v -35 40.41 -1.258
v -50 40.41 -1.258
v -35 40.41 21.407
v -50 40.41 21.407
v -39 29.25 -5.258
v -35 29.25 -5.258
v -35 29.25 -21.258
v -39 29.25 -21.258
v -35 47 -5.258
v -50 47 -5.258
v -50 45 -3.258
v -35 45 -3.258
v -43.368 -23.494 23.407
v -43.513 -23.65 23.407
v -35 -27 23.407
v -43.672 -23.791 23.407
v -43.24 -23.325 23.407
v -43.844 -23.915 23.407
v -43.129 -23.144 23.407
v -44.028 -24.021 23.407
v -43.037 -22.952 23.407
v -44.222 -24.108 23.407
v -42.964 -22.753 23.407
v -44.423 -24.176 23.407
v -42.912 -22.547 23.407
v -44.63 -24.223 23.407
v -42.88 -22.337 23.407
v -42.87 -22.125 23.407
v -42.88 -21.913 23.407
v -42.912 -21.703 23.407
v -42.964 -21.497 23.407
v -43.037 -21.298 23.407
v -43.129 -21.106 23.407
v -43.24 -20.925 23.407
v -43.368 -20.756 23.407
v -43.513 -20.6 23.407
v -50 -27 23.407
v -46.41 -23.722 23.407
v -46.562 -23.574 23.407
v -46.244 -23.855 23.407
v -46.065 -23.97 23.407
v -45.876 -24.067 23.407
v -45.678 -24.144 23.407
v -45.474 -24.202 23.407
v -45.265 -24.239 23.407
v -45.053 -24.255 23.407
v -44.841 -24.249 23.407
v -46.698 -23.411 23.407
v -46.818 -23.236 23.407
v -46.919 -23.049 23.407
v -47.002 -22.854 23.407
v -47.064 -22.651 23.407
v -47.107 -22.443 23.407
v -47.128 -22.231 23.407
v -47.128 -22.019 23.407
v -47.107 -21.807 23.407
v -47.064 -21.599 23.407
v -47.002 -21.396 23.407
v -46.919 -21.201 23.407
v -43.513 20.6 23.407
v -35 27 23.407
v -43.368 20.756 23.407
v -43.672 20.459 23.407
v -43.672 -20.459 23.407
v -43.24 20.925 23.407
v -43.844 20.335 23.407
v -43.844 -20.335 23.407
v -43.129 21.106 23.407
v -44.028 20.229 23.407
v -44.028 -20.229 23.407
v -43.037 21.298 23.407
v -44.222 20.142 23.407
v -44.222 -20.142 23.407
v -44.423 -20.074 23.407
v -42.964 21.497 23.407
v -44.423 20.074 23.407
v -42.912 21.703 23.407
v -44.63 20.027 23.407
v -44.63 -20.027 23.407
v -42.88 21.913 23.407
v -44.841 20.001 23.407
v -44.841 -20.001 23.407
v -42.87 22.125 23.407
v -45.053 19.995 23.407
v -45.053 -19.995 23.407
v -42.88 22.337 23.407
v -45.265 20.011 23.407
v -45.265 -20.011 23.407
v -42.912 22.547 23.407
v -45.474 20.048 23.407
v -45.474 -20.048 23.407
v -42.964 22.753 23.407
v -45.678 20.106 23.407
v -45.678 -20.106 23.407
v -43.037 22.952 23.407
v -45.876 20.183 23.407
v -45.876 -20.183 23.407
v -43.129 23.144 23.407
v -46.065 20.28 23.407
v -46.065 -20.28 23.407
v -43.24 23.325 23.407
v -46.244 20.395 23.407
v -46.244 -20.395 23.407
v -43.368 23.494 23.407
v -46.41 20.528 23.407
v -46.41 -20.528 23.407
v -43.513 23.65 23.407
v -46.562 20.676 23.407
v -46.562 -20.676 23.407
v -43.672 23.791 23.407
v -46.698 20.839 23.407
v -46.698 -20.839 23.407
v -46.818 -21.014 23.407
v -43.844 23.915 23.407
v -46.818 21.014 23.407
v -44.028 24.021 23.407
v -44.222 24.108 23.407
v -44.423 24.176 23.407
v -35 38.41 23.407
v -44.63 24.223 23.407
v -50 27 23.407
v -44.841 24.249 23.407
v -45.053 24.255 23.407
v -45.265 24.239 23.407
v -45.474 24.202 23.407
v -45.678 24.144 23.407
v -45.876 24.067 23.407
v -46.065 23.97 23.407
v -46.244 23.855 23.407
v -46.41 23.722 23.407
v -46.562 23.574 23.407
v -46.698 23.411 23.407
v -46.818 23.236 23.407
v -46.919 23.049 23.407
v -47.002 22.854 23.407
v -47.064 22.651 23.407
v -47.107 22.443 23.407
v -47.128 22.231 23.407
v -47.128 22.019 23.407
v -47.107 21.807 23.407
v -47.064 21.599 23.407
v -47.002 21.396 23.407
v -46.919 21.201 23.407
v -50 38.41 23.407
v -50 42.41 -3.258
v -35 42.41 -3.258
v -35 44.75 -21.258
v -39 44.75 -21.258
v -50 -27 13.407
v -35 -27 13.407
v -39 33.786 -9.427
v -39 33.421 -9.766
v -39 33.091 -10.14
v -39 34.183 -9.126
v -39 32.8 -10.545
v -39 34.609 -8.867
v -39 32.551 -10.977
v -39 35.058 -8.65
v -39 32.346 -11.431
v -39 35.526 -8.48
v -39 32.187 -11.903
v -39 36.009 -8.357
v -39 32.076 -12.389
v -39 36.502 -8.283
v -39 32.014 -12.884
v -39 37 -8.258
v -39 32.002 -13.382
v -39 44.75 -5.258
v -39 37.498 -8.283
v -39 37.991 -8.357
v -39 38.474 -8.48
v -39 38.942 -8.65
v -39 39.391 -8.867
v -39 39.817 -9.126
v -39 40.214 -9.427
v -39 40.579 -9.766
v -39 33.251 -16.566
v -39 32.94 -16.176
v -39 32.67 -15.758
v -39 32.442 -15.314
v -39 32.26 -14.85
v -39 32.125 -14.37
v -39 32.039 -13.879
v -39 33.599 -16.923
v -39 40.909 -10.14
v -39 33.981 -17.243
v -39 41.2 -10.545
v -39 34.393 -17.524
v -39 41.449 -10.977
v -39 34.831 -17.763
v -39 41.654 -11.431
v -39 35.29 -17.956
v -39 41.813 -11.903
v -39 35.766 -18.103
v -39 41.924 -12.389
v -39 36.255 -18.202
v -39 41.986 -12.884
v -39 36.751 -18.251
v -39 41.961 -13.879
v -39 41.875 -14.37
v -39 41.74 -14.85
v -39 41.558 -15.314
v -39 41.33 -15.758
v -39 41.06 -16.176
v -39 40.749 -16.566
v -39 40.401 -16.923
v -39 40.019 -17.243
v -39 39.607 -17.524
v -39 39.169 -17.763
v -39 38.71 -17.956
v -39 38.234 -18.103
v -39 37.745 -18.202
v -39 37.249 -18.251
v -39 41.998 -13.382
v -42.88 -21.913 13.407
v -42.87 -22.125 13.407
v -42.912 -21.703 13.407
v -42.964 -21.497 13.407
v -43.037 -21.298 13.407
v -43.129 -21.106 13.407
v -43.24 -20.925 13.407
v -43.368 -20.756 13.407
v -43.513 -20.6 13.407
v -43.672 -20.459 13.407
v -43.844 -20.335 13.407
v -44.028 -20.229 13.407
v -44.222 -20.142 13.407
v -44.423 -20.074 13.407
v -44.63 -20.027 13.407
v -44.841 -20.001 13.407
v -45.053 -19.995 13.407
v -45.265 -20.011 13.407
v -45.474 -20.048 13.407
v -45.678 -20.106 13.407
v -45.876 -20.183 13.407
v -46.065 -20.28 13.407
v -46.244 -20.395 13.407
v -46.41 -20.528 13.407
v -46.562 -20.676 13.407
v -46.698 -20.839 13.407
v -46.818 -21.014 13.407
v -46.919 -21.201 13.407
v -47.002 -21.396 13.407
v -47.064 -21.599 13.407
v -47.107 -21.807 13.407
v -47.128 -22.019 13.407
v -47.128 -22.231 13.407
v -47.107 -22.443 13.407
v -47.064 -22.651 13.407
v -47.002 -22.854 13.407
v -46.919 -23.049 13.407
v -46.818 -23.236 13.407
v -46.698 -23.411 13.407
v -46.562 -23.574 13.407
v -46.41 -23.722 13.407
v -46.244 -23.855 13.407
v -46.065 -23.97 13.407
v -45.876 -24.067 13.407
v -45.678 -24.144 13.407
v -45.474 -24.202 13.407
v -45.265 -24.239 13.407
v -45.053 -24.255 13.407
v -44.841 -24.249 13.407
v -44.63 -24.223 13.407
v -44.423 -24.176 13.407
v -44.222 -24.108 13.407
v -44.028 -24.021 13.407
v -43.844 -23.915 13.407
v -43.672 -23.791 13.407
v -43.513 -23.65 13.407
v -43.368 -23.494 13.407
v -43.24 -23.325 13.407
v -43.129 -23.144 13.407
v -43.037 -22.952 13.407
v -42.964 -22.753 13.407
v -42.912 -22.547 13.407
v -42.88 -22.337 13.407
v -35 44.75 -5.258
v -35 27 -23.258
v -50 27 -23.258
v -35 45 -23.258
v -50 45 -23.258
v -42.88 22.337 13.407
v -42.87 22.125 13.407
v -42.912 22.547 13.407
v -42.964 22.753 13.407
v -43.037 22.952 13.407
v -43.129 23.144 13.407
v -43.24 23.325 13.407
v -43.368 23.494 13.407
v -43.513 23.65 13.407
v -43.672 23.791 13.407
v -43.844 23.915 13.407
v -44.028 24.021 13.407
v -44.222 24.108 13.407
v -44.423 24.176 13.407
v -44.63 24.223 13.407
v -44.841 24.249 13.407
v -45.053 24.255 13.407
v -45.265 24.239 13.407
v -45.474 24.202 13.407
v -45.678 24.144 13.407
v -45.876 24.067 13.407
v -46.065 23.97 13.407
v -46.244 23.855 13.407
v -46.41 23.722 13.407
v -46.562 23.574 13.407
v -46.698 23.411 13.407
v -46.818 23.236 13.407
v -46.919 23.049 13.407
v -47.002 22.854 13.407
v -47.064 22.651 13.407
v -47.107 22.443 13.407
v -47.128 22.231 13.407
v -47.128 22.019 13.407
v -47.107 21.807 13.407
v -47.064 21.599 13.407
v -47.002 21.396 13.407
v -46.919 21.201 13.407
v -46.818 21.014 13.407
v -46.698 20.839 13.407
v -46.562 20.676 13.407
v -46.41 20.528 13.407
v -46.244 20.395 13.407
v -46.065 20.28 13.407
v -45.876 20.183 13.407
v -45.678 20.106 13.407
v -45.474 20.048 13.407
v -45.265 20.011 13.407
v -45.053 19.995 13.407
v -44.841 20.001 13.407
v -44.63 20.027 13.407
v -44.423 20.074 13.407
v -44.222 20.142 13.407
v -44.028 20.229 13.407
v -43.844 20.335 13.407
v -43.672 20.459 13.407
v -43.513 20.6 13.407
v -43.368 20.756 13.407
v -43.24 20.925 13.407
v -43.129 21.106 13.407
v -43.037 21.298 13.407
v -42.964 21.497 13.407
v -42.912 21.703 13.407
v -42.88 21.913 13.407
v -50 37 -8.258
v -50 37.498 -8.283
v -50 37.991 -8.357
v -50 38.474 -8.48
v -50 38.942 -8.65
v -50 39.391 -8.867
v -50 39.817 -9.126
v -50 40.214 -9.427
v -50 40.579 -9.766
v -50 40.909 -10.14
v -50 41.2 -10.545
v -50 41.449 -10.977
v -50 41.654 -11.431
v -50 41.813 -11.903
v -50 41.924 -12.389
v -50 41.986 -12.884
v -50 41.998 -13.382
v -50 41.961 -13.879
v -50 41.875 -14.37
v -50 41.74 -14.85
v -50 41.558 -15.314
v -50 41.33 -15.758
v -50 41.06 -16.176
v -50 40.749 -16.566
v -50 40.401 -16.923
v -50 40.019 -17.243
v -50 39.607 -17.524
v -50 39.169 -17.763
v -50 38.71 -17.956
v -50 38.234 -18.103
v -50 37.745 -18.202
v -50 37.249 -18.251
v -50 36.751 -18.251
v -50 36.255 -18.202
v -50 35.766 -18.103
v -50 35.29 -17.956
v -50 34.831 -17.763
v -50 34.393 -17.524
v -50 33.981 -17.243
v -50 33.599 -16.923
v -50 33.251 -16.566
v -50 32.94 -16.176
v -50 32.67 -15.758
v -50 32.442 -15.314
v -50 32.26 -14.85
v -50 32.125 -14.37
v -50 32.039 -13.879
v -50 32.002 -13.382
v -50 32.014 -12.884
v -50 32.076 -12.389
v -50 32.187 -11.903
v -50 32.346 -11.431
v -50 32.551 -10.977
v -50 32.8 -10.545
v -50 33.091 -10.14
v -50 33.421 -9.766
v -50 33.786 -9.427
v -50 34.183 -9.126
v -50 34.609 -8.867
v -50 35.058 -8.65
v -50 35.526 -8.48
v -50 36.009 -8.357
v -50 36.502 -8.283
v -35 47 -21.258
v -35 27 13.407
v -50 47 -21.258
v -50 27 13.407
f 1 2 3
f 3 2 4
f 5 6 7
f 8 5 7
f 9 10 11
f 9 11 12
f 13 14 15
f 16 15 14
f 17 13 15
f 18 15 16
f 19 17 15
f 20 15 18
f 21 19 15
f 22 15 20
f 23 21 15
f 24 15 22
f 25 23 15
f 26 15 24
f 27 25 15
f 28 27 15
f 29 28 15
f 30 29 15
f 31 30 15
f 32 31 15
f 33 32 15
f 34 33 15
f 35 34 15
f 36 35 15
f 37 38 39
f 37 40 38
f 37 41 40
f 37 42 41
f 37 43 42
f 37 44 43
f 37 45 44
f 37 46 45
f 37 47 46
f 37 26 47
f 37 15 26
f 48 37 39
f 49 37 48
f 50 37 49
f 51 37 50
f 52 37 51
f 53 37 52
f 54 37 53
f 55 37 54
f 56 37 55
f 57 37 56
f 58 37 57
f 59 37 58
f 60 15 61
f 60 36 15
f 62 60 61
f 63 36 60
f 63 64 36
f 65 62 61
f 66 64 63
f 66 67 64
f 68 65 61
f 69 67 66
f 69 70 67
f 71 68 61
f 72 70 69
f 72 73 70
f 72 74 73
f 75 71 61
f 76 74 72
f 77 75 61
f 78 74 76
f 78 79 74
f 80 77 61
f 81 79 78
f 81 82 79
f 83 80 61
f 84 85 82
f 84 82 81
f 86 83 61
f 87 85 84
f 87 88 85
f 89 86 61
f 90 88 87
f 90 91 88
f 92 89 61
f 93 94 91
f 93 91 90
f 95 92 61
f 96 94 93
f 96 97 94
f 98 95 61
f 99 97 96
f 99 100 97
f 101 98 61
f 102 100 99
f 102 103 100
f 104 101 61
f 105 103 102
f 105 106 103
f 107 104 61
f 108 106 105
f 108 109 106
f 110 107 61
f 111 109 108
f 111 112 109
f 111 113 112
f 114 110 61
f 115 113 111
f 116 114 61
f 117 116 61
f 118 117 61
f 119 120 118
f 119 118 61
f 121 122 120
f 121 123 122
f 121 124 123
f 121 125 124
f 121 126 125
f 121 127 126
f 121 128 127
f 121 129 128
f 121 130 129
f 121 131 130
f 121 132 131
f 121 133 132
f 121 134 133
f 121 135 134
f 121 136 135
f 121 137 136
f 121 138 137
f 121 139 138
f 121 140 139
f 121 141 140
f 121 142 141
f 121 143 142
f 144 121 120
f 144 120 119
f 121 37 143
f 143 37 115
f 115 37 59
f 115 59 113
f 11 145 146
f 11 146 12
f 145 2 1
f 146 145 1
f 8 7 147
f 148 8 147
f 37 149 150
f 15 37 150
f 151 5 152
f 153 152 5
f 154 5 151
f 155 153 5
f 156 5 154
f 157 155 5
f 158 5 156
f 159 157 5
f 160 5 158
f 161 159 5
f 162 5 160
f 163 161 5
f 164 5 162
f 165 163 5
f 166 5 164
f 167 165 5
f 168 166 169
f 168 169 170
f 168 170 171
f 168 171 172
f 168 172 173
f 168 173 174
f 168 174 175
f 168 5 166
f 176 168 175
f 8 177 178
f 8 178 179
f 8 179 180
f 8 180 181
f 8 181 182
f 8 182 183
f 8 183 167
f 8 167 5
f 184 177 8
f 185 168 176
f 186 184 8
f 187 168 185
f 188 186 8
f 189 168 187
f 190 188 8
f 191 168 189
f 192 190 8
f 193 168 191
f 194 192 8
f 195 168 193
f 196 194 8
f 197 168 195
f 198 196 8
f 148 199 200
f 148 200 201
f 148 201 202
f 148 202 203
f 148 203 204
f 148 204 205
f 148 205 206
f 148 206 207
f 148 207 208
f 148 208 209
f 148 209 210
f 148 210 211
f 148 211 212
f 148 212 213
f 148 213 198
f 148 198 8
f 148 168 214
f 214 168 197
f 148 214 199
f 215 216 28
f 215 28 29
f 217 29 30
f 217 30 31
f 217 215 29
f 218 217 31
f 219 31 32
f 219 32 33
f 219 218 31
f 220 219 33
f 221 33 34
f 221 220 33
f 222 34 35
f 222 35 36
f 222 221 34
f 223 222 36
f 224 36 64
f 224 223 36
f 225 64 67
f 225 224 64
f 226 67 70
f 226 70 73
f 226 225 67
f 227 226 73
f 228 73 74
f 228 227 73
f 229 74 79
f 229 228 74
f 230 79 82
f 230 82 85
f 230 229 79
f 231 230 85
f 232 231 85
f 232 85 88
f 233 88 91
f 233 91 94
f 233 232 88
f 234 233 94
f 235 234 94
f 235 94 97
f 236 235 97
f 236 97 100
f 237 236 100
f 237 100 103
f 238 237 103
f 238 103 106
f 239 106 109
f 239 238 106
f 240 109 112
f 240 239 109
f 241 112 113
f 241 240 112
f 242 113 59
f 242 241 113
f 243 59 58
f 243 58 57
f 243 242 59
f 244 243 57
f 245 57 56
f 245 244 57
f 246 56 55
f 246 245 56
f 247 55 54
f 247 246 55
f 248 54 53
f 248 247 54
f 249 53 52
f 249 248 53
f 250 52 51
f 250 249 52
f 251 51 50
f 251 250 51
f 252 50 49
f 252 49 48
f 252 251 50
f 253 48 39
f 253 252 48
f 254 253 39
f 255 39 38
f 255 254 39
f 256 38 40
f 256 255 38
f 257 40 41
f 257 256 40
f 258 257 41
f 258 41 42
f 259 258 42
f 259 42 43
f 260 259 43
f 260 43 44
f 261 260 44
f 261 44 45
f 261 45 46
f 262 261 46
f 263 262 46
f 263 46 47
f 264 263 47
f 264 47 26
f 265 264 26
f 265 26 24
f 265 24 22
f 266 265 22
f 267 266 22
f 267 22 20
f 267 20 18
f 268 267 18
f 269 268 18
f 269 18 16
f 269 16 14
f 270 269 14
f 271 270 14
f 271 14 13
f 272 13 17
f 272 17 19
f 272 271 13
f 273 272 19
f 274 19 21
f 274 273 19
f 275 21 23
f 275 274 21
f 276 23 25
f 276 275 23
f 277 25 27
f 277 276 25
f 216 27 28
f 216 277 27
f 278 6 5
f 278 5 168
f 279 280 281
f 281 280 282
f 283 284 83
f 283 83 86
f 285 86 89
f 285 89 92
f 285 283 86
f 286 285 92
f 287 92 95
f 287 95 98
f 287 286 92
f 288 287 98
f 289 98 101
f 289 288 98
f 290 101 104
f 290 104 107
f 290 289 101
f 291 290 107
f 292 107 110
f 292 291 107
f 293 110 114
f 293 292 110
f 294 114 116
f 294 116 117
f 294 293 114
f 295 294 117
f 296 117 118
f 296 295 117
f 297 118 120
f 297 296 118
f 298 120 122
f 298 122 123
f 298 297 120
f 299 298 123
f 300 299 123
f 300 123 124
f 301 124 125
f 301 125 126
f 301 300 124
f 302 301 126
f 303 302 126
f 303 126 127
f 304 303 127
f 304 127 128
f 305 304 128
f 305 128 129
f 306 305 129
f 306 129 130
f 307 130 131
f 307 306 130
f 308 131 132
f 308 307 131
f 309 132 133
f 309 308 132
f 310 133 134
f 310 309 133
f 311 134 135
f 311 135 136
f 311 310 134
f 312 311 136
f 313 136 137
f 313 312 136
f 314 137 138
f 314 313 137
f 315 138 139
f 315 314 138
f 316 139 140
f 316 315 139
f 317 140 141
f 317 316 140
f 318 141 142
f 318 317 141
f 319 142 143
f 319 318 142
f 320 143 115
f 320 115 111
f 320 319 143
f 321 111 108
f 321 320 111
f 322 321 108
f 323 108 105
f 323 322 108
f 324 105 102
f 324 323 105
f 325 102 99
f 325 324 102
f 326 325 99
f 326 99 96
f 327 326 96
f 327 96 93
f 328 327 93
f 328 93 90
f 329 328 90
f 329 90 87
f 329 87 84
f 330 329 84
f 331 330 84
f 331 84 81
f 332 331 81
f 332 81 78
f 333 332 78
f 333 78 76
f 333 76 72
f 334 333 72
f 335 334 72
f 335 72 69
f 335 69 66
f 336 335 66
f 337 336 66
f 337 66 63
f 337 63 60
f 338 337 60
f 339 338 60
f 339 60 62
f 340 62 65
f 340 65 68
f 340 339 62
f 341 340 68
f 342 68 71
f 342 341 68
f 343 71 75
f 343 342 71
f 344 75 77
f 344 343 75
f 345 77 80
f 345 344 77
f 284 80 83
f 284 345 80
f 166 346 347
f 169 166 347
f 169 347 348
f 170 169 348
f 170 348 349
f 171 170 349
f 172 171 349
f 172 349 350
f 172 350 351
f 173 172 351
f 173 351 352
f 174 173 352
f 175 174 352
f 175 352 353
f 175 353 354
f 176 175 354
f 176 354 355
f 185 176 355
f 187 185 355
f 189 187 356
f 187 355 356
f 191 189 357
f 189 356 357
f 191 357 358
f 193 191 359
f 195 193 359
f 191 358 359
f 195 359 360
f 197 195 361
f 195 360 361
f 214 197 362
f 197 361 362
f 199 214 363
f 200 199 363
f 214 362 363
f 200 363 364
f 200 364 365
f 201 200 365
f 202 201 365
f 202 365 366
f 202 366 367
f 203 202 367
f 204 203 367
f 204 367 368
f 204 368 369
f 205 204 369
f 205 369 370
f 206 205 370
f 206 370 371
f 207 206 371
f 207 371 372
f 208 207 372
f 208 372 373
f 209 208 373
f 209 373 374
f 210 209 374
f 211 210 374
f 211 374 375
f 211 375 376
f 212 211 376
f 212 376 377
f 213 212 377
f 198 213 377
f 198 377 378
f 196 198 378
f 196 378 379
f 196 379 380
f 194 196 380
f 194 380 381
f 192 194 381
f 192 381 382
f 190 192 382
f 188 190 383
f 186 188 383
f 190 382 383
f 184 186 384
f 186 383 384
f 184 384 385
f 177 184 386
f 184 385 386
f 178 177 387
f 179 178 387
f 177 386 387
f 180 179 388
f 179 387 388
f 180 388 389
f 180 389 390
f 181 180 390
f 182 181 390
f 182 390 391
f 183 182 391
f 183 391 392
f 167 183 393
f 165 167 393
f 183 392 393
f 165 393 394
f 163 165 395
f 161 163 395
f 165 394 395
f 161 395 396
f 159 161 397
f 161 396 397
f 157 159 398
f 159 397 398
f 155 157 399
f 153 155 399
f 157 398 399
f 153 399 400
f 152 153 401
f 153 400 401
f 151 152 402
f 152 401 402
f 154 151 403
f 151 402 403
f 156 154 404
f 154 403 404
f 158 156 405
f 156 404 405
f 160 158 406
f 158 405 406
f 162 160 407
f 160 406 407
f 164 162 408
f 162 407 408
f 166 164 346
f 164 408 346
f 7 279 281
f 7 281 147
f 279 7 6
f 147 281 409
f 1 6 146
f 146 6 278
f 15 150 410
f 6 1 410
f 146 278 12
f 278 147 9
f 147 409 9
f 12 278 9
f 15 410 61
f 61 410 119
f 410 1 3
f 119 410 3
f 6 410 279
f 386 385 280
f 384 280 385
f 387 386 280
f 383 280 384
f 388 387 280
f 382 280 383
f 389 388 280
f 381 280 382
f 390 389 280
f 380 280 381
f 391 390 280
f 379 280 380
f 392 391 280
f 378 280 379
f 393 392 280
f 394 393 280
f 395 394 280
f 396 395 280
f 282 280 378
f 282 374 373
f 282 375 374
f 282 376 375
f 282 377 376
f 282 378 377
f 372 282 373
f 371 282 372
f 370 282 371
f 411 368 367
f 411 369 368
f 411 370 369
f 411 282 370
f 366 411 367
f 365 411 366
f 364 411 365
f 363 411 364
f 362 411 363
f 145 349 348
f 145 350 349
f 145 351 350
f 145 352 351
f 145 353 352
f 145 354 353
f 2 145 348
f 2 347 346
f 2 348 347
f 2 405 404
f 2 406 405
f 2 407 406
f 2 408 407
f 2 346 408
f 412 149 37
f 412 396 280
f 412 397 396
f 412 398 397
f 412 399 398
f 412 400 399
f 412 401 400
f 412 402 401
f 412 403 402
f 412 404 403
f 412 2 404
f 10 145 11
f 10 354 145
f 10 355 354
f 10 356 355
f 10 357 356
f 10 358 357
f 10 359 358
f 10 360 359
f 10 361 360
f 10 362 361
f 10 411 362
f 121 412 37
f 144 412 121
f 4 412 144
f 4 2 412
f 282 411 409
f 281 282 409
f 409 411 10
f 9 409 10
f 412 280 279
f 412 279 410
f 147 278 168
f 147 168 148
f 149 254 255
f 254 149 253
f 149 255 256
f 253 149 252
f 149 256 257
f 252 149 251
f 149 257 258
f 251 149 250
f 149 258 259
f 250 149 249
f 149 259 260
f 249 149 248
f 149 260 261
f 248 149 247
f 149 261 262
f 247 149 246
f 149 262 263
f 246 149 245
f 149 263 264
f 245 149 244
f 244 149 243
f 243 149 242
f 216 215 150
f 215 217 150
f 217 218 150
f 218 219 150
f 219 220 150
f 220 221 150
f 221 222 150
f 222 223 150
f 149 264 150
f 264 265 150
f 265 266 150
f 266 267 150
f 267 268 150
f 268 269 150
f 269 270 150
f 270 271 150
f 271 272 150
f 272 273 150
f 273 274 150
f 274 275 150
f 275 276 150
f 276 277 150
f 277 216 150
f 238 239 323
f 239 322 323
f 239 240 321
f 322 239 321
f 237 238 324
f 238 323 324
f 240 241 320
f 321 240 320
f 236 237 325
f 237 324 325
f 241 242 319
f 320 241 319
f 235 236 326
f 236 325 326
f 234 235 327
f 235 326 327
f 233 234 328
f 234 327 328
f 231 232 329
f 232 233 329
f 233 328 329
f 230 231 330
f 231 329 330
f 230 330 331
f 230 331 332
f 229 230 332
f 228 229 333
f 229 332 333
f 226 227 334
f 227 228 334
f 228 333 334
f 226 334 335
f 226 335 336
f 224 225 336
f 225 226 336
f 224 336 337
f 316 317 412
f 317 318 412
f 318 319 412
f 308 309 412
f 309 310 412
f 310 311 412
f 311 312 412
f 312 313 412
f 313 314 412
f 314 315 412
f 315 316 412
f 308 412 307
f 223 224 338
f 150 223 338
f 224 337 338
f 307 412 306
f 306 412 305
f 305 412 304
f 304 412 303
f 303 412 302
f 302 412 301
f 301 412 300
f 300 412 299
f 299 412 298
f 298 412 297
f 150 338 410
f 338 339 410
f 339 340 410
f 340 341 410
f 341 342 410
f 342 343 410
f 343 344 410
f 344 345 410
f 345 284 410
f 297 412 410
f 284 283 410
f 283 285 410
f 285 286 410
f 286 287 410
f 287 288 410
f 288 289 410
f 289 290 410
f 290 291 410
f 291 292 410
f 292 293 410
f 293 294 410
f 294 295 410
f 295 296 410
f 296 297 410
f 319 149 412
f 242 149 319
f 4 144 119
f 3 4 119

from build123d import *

# Parameters (mm, degrees)
SKETCH1_W           = 15
SKETCH1_H           = 54
SKETCH1_R           = 2.1303
BOSS_EXTRUDE1_DEPTH = 10
SKETCH2_W           = 20
SKETCH2_H           = 20
SKETCH2_R           = 5
BOSS_EXTRUDE2_DEPTH = 15
SKETCH5_W           = 26.664475469
SKETCH5_H           = 13.40994033
BOSS_EXTRUDE3_DEPTH = 15
SKETCH3_W           = 16
SKETCH3_H           = 15.5
CUT_EXTRUDE2_DEPTH  = 4
CHAMFER1_SIZE       = 2
CHAMFER2_SIZE       = 2


with BuildPart() as part:
    # Sketch1 → Boss-Extrude1 (new body)
    with BuildSketch(Plane.XY.offset(13.406799166)):
        with Locations((-42.5, 0)):
            Rectangle(SKETCH1_W, SKETCH1_H)
        with Locations((-45, -22.125)):
            Circle(SKETCH1_R, mode=Mode.SUBTRACT)
        with Locations((-45, 22.125)):
            Circle(SKETCH1_R, mode=Mode.SUBTRACT)
    extrude(amount=BOSS_EXTRUDE1_DEPTH)



with BuildPart() as body_2:
    # Sketch2 → Boss-Extrude2 (new body)
    with BuildSketch(Plane.ZY.offset(50)):
        with Locations((-13.257676303, 37)):
            Rectangle(SKETCH2_W, SKETCH2_H)
        with Locations((-13.257676303, 37)):
            Circle(SKETCH2_R, mode=Mode.SUBTRACT)
    extrude(amount=-BOSS_EXTRUDE2_DEPTH)


with BuildPart() as part_1:
    add(part.part)

    add(body_2.part)  # Boss-Extrude3 merges body 2
    # Sketch5 → Boss-Extrude3 (add)
    with BuildSketch(Plane.ZY.offset(50)):
        with Locations((10.074561432, 33.704970165)):
            Rectangle(SKETCH5_W, SKETCH5_H)
    extrude(amount=-BOSS_EXTRUDE3_DEPTH)

    # Sketch3 → Cut-Extrude2 (cut)
    with BuildSketch(Plane(origin=(-35, 0, 0), x_dir=(0, 0, -1), z_dir=(1, 0, 0))):
        with Locations((13.257676303, 37)):
            Rectangle(SKETCH3_W, SKETCH3_H)
    extrude(amount=-CUT_EXTRUDE2_DEPTH, mode=Mode.SUBTRACT)

    # Chamfer1
    chamfer1_edges = [part_1.edges().sort_by_distance(p)[0] for p in [
        (-42.5, 47, -3.257676303),
        (-42.5, 47, -23.257676303),
    ]]
    chamfer(chamfer1_edges, length=CHAMFER1_SIZE)

    # Chamfer2
    chamfer2_edges = [part_1.edges().sort_by_distance(p)[0] for p in [
        (-42.5, 40.40994033, -3.257676303),
        (-42.5, 40.40994033, 23.406799166),
    ]]
    chamfer(chamfer2_edges, length=CHAMFER2_SIZE)


solid = part_1.part
